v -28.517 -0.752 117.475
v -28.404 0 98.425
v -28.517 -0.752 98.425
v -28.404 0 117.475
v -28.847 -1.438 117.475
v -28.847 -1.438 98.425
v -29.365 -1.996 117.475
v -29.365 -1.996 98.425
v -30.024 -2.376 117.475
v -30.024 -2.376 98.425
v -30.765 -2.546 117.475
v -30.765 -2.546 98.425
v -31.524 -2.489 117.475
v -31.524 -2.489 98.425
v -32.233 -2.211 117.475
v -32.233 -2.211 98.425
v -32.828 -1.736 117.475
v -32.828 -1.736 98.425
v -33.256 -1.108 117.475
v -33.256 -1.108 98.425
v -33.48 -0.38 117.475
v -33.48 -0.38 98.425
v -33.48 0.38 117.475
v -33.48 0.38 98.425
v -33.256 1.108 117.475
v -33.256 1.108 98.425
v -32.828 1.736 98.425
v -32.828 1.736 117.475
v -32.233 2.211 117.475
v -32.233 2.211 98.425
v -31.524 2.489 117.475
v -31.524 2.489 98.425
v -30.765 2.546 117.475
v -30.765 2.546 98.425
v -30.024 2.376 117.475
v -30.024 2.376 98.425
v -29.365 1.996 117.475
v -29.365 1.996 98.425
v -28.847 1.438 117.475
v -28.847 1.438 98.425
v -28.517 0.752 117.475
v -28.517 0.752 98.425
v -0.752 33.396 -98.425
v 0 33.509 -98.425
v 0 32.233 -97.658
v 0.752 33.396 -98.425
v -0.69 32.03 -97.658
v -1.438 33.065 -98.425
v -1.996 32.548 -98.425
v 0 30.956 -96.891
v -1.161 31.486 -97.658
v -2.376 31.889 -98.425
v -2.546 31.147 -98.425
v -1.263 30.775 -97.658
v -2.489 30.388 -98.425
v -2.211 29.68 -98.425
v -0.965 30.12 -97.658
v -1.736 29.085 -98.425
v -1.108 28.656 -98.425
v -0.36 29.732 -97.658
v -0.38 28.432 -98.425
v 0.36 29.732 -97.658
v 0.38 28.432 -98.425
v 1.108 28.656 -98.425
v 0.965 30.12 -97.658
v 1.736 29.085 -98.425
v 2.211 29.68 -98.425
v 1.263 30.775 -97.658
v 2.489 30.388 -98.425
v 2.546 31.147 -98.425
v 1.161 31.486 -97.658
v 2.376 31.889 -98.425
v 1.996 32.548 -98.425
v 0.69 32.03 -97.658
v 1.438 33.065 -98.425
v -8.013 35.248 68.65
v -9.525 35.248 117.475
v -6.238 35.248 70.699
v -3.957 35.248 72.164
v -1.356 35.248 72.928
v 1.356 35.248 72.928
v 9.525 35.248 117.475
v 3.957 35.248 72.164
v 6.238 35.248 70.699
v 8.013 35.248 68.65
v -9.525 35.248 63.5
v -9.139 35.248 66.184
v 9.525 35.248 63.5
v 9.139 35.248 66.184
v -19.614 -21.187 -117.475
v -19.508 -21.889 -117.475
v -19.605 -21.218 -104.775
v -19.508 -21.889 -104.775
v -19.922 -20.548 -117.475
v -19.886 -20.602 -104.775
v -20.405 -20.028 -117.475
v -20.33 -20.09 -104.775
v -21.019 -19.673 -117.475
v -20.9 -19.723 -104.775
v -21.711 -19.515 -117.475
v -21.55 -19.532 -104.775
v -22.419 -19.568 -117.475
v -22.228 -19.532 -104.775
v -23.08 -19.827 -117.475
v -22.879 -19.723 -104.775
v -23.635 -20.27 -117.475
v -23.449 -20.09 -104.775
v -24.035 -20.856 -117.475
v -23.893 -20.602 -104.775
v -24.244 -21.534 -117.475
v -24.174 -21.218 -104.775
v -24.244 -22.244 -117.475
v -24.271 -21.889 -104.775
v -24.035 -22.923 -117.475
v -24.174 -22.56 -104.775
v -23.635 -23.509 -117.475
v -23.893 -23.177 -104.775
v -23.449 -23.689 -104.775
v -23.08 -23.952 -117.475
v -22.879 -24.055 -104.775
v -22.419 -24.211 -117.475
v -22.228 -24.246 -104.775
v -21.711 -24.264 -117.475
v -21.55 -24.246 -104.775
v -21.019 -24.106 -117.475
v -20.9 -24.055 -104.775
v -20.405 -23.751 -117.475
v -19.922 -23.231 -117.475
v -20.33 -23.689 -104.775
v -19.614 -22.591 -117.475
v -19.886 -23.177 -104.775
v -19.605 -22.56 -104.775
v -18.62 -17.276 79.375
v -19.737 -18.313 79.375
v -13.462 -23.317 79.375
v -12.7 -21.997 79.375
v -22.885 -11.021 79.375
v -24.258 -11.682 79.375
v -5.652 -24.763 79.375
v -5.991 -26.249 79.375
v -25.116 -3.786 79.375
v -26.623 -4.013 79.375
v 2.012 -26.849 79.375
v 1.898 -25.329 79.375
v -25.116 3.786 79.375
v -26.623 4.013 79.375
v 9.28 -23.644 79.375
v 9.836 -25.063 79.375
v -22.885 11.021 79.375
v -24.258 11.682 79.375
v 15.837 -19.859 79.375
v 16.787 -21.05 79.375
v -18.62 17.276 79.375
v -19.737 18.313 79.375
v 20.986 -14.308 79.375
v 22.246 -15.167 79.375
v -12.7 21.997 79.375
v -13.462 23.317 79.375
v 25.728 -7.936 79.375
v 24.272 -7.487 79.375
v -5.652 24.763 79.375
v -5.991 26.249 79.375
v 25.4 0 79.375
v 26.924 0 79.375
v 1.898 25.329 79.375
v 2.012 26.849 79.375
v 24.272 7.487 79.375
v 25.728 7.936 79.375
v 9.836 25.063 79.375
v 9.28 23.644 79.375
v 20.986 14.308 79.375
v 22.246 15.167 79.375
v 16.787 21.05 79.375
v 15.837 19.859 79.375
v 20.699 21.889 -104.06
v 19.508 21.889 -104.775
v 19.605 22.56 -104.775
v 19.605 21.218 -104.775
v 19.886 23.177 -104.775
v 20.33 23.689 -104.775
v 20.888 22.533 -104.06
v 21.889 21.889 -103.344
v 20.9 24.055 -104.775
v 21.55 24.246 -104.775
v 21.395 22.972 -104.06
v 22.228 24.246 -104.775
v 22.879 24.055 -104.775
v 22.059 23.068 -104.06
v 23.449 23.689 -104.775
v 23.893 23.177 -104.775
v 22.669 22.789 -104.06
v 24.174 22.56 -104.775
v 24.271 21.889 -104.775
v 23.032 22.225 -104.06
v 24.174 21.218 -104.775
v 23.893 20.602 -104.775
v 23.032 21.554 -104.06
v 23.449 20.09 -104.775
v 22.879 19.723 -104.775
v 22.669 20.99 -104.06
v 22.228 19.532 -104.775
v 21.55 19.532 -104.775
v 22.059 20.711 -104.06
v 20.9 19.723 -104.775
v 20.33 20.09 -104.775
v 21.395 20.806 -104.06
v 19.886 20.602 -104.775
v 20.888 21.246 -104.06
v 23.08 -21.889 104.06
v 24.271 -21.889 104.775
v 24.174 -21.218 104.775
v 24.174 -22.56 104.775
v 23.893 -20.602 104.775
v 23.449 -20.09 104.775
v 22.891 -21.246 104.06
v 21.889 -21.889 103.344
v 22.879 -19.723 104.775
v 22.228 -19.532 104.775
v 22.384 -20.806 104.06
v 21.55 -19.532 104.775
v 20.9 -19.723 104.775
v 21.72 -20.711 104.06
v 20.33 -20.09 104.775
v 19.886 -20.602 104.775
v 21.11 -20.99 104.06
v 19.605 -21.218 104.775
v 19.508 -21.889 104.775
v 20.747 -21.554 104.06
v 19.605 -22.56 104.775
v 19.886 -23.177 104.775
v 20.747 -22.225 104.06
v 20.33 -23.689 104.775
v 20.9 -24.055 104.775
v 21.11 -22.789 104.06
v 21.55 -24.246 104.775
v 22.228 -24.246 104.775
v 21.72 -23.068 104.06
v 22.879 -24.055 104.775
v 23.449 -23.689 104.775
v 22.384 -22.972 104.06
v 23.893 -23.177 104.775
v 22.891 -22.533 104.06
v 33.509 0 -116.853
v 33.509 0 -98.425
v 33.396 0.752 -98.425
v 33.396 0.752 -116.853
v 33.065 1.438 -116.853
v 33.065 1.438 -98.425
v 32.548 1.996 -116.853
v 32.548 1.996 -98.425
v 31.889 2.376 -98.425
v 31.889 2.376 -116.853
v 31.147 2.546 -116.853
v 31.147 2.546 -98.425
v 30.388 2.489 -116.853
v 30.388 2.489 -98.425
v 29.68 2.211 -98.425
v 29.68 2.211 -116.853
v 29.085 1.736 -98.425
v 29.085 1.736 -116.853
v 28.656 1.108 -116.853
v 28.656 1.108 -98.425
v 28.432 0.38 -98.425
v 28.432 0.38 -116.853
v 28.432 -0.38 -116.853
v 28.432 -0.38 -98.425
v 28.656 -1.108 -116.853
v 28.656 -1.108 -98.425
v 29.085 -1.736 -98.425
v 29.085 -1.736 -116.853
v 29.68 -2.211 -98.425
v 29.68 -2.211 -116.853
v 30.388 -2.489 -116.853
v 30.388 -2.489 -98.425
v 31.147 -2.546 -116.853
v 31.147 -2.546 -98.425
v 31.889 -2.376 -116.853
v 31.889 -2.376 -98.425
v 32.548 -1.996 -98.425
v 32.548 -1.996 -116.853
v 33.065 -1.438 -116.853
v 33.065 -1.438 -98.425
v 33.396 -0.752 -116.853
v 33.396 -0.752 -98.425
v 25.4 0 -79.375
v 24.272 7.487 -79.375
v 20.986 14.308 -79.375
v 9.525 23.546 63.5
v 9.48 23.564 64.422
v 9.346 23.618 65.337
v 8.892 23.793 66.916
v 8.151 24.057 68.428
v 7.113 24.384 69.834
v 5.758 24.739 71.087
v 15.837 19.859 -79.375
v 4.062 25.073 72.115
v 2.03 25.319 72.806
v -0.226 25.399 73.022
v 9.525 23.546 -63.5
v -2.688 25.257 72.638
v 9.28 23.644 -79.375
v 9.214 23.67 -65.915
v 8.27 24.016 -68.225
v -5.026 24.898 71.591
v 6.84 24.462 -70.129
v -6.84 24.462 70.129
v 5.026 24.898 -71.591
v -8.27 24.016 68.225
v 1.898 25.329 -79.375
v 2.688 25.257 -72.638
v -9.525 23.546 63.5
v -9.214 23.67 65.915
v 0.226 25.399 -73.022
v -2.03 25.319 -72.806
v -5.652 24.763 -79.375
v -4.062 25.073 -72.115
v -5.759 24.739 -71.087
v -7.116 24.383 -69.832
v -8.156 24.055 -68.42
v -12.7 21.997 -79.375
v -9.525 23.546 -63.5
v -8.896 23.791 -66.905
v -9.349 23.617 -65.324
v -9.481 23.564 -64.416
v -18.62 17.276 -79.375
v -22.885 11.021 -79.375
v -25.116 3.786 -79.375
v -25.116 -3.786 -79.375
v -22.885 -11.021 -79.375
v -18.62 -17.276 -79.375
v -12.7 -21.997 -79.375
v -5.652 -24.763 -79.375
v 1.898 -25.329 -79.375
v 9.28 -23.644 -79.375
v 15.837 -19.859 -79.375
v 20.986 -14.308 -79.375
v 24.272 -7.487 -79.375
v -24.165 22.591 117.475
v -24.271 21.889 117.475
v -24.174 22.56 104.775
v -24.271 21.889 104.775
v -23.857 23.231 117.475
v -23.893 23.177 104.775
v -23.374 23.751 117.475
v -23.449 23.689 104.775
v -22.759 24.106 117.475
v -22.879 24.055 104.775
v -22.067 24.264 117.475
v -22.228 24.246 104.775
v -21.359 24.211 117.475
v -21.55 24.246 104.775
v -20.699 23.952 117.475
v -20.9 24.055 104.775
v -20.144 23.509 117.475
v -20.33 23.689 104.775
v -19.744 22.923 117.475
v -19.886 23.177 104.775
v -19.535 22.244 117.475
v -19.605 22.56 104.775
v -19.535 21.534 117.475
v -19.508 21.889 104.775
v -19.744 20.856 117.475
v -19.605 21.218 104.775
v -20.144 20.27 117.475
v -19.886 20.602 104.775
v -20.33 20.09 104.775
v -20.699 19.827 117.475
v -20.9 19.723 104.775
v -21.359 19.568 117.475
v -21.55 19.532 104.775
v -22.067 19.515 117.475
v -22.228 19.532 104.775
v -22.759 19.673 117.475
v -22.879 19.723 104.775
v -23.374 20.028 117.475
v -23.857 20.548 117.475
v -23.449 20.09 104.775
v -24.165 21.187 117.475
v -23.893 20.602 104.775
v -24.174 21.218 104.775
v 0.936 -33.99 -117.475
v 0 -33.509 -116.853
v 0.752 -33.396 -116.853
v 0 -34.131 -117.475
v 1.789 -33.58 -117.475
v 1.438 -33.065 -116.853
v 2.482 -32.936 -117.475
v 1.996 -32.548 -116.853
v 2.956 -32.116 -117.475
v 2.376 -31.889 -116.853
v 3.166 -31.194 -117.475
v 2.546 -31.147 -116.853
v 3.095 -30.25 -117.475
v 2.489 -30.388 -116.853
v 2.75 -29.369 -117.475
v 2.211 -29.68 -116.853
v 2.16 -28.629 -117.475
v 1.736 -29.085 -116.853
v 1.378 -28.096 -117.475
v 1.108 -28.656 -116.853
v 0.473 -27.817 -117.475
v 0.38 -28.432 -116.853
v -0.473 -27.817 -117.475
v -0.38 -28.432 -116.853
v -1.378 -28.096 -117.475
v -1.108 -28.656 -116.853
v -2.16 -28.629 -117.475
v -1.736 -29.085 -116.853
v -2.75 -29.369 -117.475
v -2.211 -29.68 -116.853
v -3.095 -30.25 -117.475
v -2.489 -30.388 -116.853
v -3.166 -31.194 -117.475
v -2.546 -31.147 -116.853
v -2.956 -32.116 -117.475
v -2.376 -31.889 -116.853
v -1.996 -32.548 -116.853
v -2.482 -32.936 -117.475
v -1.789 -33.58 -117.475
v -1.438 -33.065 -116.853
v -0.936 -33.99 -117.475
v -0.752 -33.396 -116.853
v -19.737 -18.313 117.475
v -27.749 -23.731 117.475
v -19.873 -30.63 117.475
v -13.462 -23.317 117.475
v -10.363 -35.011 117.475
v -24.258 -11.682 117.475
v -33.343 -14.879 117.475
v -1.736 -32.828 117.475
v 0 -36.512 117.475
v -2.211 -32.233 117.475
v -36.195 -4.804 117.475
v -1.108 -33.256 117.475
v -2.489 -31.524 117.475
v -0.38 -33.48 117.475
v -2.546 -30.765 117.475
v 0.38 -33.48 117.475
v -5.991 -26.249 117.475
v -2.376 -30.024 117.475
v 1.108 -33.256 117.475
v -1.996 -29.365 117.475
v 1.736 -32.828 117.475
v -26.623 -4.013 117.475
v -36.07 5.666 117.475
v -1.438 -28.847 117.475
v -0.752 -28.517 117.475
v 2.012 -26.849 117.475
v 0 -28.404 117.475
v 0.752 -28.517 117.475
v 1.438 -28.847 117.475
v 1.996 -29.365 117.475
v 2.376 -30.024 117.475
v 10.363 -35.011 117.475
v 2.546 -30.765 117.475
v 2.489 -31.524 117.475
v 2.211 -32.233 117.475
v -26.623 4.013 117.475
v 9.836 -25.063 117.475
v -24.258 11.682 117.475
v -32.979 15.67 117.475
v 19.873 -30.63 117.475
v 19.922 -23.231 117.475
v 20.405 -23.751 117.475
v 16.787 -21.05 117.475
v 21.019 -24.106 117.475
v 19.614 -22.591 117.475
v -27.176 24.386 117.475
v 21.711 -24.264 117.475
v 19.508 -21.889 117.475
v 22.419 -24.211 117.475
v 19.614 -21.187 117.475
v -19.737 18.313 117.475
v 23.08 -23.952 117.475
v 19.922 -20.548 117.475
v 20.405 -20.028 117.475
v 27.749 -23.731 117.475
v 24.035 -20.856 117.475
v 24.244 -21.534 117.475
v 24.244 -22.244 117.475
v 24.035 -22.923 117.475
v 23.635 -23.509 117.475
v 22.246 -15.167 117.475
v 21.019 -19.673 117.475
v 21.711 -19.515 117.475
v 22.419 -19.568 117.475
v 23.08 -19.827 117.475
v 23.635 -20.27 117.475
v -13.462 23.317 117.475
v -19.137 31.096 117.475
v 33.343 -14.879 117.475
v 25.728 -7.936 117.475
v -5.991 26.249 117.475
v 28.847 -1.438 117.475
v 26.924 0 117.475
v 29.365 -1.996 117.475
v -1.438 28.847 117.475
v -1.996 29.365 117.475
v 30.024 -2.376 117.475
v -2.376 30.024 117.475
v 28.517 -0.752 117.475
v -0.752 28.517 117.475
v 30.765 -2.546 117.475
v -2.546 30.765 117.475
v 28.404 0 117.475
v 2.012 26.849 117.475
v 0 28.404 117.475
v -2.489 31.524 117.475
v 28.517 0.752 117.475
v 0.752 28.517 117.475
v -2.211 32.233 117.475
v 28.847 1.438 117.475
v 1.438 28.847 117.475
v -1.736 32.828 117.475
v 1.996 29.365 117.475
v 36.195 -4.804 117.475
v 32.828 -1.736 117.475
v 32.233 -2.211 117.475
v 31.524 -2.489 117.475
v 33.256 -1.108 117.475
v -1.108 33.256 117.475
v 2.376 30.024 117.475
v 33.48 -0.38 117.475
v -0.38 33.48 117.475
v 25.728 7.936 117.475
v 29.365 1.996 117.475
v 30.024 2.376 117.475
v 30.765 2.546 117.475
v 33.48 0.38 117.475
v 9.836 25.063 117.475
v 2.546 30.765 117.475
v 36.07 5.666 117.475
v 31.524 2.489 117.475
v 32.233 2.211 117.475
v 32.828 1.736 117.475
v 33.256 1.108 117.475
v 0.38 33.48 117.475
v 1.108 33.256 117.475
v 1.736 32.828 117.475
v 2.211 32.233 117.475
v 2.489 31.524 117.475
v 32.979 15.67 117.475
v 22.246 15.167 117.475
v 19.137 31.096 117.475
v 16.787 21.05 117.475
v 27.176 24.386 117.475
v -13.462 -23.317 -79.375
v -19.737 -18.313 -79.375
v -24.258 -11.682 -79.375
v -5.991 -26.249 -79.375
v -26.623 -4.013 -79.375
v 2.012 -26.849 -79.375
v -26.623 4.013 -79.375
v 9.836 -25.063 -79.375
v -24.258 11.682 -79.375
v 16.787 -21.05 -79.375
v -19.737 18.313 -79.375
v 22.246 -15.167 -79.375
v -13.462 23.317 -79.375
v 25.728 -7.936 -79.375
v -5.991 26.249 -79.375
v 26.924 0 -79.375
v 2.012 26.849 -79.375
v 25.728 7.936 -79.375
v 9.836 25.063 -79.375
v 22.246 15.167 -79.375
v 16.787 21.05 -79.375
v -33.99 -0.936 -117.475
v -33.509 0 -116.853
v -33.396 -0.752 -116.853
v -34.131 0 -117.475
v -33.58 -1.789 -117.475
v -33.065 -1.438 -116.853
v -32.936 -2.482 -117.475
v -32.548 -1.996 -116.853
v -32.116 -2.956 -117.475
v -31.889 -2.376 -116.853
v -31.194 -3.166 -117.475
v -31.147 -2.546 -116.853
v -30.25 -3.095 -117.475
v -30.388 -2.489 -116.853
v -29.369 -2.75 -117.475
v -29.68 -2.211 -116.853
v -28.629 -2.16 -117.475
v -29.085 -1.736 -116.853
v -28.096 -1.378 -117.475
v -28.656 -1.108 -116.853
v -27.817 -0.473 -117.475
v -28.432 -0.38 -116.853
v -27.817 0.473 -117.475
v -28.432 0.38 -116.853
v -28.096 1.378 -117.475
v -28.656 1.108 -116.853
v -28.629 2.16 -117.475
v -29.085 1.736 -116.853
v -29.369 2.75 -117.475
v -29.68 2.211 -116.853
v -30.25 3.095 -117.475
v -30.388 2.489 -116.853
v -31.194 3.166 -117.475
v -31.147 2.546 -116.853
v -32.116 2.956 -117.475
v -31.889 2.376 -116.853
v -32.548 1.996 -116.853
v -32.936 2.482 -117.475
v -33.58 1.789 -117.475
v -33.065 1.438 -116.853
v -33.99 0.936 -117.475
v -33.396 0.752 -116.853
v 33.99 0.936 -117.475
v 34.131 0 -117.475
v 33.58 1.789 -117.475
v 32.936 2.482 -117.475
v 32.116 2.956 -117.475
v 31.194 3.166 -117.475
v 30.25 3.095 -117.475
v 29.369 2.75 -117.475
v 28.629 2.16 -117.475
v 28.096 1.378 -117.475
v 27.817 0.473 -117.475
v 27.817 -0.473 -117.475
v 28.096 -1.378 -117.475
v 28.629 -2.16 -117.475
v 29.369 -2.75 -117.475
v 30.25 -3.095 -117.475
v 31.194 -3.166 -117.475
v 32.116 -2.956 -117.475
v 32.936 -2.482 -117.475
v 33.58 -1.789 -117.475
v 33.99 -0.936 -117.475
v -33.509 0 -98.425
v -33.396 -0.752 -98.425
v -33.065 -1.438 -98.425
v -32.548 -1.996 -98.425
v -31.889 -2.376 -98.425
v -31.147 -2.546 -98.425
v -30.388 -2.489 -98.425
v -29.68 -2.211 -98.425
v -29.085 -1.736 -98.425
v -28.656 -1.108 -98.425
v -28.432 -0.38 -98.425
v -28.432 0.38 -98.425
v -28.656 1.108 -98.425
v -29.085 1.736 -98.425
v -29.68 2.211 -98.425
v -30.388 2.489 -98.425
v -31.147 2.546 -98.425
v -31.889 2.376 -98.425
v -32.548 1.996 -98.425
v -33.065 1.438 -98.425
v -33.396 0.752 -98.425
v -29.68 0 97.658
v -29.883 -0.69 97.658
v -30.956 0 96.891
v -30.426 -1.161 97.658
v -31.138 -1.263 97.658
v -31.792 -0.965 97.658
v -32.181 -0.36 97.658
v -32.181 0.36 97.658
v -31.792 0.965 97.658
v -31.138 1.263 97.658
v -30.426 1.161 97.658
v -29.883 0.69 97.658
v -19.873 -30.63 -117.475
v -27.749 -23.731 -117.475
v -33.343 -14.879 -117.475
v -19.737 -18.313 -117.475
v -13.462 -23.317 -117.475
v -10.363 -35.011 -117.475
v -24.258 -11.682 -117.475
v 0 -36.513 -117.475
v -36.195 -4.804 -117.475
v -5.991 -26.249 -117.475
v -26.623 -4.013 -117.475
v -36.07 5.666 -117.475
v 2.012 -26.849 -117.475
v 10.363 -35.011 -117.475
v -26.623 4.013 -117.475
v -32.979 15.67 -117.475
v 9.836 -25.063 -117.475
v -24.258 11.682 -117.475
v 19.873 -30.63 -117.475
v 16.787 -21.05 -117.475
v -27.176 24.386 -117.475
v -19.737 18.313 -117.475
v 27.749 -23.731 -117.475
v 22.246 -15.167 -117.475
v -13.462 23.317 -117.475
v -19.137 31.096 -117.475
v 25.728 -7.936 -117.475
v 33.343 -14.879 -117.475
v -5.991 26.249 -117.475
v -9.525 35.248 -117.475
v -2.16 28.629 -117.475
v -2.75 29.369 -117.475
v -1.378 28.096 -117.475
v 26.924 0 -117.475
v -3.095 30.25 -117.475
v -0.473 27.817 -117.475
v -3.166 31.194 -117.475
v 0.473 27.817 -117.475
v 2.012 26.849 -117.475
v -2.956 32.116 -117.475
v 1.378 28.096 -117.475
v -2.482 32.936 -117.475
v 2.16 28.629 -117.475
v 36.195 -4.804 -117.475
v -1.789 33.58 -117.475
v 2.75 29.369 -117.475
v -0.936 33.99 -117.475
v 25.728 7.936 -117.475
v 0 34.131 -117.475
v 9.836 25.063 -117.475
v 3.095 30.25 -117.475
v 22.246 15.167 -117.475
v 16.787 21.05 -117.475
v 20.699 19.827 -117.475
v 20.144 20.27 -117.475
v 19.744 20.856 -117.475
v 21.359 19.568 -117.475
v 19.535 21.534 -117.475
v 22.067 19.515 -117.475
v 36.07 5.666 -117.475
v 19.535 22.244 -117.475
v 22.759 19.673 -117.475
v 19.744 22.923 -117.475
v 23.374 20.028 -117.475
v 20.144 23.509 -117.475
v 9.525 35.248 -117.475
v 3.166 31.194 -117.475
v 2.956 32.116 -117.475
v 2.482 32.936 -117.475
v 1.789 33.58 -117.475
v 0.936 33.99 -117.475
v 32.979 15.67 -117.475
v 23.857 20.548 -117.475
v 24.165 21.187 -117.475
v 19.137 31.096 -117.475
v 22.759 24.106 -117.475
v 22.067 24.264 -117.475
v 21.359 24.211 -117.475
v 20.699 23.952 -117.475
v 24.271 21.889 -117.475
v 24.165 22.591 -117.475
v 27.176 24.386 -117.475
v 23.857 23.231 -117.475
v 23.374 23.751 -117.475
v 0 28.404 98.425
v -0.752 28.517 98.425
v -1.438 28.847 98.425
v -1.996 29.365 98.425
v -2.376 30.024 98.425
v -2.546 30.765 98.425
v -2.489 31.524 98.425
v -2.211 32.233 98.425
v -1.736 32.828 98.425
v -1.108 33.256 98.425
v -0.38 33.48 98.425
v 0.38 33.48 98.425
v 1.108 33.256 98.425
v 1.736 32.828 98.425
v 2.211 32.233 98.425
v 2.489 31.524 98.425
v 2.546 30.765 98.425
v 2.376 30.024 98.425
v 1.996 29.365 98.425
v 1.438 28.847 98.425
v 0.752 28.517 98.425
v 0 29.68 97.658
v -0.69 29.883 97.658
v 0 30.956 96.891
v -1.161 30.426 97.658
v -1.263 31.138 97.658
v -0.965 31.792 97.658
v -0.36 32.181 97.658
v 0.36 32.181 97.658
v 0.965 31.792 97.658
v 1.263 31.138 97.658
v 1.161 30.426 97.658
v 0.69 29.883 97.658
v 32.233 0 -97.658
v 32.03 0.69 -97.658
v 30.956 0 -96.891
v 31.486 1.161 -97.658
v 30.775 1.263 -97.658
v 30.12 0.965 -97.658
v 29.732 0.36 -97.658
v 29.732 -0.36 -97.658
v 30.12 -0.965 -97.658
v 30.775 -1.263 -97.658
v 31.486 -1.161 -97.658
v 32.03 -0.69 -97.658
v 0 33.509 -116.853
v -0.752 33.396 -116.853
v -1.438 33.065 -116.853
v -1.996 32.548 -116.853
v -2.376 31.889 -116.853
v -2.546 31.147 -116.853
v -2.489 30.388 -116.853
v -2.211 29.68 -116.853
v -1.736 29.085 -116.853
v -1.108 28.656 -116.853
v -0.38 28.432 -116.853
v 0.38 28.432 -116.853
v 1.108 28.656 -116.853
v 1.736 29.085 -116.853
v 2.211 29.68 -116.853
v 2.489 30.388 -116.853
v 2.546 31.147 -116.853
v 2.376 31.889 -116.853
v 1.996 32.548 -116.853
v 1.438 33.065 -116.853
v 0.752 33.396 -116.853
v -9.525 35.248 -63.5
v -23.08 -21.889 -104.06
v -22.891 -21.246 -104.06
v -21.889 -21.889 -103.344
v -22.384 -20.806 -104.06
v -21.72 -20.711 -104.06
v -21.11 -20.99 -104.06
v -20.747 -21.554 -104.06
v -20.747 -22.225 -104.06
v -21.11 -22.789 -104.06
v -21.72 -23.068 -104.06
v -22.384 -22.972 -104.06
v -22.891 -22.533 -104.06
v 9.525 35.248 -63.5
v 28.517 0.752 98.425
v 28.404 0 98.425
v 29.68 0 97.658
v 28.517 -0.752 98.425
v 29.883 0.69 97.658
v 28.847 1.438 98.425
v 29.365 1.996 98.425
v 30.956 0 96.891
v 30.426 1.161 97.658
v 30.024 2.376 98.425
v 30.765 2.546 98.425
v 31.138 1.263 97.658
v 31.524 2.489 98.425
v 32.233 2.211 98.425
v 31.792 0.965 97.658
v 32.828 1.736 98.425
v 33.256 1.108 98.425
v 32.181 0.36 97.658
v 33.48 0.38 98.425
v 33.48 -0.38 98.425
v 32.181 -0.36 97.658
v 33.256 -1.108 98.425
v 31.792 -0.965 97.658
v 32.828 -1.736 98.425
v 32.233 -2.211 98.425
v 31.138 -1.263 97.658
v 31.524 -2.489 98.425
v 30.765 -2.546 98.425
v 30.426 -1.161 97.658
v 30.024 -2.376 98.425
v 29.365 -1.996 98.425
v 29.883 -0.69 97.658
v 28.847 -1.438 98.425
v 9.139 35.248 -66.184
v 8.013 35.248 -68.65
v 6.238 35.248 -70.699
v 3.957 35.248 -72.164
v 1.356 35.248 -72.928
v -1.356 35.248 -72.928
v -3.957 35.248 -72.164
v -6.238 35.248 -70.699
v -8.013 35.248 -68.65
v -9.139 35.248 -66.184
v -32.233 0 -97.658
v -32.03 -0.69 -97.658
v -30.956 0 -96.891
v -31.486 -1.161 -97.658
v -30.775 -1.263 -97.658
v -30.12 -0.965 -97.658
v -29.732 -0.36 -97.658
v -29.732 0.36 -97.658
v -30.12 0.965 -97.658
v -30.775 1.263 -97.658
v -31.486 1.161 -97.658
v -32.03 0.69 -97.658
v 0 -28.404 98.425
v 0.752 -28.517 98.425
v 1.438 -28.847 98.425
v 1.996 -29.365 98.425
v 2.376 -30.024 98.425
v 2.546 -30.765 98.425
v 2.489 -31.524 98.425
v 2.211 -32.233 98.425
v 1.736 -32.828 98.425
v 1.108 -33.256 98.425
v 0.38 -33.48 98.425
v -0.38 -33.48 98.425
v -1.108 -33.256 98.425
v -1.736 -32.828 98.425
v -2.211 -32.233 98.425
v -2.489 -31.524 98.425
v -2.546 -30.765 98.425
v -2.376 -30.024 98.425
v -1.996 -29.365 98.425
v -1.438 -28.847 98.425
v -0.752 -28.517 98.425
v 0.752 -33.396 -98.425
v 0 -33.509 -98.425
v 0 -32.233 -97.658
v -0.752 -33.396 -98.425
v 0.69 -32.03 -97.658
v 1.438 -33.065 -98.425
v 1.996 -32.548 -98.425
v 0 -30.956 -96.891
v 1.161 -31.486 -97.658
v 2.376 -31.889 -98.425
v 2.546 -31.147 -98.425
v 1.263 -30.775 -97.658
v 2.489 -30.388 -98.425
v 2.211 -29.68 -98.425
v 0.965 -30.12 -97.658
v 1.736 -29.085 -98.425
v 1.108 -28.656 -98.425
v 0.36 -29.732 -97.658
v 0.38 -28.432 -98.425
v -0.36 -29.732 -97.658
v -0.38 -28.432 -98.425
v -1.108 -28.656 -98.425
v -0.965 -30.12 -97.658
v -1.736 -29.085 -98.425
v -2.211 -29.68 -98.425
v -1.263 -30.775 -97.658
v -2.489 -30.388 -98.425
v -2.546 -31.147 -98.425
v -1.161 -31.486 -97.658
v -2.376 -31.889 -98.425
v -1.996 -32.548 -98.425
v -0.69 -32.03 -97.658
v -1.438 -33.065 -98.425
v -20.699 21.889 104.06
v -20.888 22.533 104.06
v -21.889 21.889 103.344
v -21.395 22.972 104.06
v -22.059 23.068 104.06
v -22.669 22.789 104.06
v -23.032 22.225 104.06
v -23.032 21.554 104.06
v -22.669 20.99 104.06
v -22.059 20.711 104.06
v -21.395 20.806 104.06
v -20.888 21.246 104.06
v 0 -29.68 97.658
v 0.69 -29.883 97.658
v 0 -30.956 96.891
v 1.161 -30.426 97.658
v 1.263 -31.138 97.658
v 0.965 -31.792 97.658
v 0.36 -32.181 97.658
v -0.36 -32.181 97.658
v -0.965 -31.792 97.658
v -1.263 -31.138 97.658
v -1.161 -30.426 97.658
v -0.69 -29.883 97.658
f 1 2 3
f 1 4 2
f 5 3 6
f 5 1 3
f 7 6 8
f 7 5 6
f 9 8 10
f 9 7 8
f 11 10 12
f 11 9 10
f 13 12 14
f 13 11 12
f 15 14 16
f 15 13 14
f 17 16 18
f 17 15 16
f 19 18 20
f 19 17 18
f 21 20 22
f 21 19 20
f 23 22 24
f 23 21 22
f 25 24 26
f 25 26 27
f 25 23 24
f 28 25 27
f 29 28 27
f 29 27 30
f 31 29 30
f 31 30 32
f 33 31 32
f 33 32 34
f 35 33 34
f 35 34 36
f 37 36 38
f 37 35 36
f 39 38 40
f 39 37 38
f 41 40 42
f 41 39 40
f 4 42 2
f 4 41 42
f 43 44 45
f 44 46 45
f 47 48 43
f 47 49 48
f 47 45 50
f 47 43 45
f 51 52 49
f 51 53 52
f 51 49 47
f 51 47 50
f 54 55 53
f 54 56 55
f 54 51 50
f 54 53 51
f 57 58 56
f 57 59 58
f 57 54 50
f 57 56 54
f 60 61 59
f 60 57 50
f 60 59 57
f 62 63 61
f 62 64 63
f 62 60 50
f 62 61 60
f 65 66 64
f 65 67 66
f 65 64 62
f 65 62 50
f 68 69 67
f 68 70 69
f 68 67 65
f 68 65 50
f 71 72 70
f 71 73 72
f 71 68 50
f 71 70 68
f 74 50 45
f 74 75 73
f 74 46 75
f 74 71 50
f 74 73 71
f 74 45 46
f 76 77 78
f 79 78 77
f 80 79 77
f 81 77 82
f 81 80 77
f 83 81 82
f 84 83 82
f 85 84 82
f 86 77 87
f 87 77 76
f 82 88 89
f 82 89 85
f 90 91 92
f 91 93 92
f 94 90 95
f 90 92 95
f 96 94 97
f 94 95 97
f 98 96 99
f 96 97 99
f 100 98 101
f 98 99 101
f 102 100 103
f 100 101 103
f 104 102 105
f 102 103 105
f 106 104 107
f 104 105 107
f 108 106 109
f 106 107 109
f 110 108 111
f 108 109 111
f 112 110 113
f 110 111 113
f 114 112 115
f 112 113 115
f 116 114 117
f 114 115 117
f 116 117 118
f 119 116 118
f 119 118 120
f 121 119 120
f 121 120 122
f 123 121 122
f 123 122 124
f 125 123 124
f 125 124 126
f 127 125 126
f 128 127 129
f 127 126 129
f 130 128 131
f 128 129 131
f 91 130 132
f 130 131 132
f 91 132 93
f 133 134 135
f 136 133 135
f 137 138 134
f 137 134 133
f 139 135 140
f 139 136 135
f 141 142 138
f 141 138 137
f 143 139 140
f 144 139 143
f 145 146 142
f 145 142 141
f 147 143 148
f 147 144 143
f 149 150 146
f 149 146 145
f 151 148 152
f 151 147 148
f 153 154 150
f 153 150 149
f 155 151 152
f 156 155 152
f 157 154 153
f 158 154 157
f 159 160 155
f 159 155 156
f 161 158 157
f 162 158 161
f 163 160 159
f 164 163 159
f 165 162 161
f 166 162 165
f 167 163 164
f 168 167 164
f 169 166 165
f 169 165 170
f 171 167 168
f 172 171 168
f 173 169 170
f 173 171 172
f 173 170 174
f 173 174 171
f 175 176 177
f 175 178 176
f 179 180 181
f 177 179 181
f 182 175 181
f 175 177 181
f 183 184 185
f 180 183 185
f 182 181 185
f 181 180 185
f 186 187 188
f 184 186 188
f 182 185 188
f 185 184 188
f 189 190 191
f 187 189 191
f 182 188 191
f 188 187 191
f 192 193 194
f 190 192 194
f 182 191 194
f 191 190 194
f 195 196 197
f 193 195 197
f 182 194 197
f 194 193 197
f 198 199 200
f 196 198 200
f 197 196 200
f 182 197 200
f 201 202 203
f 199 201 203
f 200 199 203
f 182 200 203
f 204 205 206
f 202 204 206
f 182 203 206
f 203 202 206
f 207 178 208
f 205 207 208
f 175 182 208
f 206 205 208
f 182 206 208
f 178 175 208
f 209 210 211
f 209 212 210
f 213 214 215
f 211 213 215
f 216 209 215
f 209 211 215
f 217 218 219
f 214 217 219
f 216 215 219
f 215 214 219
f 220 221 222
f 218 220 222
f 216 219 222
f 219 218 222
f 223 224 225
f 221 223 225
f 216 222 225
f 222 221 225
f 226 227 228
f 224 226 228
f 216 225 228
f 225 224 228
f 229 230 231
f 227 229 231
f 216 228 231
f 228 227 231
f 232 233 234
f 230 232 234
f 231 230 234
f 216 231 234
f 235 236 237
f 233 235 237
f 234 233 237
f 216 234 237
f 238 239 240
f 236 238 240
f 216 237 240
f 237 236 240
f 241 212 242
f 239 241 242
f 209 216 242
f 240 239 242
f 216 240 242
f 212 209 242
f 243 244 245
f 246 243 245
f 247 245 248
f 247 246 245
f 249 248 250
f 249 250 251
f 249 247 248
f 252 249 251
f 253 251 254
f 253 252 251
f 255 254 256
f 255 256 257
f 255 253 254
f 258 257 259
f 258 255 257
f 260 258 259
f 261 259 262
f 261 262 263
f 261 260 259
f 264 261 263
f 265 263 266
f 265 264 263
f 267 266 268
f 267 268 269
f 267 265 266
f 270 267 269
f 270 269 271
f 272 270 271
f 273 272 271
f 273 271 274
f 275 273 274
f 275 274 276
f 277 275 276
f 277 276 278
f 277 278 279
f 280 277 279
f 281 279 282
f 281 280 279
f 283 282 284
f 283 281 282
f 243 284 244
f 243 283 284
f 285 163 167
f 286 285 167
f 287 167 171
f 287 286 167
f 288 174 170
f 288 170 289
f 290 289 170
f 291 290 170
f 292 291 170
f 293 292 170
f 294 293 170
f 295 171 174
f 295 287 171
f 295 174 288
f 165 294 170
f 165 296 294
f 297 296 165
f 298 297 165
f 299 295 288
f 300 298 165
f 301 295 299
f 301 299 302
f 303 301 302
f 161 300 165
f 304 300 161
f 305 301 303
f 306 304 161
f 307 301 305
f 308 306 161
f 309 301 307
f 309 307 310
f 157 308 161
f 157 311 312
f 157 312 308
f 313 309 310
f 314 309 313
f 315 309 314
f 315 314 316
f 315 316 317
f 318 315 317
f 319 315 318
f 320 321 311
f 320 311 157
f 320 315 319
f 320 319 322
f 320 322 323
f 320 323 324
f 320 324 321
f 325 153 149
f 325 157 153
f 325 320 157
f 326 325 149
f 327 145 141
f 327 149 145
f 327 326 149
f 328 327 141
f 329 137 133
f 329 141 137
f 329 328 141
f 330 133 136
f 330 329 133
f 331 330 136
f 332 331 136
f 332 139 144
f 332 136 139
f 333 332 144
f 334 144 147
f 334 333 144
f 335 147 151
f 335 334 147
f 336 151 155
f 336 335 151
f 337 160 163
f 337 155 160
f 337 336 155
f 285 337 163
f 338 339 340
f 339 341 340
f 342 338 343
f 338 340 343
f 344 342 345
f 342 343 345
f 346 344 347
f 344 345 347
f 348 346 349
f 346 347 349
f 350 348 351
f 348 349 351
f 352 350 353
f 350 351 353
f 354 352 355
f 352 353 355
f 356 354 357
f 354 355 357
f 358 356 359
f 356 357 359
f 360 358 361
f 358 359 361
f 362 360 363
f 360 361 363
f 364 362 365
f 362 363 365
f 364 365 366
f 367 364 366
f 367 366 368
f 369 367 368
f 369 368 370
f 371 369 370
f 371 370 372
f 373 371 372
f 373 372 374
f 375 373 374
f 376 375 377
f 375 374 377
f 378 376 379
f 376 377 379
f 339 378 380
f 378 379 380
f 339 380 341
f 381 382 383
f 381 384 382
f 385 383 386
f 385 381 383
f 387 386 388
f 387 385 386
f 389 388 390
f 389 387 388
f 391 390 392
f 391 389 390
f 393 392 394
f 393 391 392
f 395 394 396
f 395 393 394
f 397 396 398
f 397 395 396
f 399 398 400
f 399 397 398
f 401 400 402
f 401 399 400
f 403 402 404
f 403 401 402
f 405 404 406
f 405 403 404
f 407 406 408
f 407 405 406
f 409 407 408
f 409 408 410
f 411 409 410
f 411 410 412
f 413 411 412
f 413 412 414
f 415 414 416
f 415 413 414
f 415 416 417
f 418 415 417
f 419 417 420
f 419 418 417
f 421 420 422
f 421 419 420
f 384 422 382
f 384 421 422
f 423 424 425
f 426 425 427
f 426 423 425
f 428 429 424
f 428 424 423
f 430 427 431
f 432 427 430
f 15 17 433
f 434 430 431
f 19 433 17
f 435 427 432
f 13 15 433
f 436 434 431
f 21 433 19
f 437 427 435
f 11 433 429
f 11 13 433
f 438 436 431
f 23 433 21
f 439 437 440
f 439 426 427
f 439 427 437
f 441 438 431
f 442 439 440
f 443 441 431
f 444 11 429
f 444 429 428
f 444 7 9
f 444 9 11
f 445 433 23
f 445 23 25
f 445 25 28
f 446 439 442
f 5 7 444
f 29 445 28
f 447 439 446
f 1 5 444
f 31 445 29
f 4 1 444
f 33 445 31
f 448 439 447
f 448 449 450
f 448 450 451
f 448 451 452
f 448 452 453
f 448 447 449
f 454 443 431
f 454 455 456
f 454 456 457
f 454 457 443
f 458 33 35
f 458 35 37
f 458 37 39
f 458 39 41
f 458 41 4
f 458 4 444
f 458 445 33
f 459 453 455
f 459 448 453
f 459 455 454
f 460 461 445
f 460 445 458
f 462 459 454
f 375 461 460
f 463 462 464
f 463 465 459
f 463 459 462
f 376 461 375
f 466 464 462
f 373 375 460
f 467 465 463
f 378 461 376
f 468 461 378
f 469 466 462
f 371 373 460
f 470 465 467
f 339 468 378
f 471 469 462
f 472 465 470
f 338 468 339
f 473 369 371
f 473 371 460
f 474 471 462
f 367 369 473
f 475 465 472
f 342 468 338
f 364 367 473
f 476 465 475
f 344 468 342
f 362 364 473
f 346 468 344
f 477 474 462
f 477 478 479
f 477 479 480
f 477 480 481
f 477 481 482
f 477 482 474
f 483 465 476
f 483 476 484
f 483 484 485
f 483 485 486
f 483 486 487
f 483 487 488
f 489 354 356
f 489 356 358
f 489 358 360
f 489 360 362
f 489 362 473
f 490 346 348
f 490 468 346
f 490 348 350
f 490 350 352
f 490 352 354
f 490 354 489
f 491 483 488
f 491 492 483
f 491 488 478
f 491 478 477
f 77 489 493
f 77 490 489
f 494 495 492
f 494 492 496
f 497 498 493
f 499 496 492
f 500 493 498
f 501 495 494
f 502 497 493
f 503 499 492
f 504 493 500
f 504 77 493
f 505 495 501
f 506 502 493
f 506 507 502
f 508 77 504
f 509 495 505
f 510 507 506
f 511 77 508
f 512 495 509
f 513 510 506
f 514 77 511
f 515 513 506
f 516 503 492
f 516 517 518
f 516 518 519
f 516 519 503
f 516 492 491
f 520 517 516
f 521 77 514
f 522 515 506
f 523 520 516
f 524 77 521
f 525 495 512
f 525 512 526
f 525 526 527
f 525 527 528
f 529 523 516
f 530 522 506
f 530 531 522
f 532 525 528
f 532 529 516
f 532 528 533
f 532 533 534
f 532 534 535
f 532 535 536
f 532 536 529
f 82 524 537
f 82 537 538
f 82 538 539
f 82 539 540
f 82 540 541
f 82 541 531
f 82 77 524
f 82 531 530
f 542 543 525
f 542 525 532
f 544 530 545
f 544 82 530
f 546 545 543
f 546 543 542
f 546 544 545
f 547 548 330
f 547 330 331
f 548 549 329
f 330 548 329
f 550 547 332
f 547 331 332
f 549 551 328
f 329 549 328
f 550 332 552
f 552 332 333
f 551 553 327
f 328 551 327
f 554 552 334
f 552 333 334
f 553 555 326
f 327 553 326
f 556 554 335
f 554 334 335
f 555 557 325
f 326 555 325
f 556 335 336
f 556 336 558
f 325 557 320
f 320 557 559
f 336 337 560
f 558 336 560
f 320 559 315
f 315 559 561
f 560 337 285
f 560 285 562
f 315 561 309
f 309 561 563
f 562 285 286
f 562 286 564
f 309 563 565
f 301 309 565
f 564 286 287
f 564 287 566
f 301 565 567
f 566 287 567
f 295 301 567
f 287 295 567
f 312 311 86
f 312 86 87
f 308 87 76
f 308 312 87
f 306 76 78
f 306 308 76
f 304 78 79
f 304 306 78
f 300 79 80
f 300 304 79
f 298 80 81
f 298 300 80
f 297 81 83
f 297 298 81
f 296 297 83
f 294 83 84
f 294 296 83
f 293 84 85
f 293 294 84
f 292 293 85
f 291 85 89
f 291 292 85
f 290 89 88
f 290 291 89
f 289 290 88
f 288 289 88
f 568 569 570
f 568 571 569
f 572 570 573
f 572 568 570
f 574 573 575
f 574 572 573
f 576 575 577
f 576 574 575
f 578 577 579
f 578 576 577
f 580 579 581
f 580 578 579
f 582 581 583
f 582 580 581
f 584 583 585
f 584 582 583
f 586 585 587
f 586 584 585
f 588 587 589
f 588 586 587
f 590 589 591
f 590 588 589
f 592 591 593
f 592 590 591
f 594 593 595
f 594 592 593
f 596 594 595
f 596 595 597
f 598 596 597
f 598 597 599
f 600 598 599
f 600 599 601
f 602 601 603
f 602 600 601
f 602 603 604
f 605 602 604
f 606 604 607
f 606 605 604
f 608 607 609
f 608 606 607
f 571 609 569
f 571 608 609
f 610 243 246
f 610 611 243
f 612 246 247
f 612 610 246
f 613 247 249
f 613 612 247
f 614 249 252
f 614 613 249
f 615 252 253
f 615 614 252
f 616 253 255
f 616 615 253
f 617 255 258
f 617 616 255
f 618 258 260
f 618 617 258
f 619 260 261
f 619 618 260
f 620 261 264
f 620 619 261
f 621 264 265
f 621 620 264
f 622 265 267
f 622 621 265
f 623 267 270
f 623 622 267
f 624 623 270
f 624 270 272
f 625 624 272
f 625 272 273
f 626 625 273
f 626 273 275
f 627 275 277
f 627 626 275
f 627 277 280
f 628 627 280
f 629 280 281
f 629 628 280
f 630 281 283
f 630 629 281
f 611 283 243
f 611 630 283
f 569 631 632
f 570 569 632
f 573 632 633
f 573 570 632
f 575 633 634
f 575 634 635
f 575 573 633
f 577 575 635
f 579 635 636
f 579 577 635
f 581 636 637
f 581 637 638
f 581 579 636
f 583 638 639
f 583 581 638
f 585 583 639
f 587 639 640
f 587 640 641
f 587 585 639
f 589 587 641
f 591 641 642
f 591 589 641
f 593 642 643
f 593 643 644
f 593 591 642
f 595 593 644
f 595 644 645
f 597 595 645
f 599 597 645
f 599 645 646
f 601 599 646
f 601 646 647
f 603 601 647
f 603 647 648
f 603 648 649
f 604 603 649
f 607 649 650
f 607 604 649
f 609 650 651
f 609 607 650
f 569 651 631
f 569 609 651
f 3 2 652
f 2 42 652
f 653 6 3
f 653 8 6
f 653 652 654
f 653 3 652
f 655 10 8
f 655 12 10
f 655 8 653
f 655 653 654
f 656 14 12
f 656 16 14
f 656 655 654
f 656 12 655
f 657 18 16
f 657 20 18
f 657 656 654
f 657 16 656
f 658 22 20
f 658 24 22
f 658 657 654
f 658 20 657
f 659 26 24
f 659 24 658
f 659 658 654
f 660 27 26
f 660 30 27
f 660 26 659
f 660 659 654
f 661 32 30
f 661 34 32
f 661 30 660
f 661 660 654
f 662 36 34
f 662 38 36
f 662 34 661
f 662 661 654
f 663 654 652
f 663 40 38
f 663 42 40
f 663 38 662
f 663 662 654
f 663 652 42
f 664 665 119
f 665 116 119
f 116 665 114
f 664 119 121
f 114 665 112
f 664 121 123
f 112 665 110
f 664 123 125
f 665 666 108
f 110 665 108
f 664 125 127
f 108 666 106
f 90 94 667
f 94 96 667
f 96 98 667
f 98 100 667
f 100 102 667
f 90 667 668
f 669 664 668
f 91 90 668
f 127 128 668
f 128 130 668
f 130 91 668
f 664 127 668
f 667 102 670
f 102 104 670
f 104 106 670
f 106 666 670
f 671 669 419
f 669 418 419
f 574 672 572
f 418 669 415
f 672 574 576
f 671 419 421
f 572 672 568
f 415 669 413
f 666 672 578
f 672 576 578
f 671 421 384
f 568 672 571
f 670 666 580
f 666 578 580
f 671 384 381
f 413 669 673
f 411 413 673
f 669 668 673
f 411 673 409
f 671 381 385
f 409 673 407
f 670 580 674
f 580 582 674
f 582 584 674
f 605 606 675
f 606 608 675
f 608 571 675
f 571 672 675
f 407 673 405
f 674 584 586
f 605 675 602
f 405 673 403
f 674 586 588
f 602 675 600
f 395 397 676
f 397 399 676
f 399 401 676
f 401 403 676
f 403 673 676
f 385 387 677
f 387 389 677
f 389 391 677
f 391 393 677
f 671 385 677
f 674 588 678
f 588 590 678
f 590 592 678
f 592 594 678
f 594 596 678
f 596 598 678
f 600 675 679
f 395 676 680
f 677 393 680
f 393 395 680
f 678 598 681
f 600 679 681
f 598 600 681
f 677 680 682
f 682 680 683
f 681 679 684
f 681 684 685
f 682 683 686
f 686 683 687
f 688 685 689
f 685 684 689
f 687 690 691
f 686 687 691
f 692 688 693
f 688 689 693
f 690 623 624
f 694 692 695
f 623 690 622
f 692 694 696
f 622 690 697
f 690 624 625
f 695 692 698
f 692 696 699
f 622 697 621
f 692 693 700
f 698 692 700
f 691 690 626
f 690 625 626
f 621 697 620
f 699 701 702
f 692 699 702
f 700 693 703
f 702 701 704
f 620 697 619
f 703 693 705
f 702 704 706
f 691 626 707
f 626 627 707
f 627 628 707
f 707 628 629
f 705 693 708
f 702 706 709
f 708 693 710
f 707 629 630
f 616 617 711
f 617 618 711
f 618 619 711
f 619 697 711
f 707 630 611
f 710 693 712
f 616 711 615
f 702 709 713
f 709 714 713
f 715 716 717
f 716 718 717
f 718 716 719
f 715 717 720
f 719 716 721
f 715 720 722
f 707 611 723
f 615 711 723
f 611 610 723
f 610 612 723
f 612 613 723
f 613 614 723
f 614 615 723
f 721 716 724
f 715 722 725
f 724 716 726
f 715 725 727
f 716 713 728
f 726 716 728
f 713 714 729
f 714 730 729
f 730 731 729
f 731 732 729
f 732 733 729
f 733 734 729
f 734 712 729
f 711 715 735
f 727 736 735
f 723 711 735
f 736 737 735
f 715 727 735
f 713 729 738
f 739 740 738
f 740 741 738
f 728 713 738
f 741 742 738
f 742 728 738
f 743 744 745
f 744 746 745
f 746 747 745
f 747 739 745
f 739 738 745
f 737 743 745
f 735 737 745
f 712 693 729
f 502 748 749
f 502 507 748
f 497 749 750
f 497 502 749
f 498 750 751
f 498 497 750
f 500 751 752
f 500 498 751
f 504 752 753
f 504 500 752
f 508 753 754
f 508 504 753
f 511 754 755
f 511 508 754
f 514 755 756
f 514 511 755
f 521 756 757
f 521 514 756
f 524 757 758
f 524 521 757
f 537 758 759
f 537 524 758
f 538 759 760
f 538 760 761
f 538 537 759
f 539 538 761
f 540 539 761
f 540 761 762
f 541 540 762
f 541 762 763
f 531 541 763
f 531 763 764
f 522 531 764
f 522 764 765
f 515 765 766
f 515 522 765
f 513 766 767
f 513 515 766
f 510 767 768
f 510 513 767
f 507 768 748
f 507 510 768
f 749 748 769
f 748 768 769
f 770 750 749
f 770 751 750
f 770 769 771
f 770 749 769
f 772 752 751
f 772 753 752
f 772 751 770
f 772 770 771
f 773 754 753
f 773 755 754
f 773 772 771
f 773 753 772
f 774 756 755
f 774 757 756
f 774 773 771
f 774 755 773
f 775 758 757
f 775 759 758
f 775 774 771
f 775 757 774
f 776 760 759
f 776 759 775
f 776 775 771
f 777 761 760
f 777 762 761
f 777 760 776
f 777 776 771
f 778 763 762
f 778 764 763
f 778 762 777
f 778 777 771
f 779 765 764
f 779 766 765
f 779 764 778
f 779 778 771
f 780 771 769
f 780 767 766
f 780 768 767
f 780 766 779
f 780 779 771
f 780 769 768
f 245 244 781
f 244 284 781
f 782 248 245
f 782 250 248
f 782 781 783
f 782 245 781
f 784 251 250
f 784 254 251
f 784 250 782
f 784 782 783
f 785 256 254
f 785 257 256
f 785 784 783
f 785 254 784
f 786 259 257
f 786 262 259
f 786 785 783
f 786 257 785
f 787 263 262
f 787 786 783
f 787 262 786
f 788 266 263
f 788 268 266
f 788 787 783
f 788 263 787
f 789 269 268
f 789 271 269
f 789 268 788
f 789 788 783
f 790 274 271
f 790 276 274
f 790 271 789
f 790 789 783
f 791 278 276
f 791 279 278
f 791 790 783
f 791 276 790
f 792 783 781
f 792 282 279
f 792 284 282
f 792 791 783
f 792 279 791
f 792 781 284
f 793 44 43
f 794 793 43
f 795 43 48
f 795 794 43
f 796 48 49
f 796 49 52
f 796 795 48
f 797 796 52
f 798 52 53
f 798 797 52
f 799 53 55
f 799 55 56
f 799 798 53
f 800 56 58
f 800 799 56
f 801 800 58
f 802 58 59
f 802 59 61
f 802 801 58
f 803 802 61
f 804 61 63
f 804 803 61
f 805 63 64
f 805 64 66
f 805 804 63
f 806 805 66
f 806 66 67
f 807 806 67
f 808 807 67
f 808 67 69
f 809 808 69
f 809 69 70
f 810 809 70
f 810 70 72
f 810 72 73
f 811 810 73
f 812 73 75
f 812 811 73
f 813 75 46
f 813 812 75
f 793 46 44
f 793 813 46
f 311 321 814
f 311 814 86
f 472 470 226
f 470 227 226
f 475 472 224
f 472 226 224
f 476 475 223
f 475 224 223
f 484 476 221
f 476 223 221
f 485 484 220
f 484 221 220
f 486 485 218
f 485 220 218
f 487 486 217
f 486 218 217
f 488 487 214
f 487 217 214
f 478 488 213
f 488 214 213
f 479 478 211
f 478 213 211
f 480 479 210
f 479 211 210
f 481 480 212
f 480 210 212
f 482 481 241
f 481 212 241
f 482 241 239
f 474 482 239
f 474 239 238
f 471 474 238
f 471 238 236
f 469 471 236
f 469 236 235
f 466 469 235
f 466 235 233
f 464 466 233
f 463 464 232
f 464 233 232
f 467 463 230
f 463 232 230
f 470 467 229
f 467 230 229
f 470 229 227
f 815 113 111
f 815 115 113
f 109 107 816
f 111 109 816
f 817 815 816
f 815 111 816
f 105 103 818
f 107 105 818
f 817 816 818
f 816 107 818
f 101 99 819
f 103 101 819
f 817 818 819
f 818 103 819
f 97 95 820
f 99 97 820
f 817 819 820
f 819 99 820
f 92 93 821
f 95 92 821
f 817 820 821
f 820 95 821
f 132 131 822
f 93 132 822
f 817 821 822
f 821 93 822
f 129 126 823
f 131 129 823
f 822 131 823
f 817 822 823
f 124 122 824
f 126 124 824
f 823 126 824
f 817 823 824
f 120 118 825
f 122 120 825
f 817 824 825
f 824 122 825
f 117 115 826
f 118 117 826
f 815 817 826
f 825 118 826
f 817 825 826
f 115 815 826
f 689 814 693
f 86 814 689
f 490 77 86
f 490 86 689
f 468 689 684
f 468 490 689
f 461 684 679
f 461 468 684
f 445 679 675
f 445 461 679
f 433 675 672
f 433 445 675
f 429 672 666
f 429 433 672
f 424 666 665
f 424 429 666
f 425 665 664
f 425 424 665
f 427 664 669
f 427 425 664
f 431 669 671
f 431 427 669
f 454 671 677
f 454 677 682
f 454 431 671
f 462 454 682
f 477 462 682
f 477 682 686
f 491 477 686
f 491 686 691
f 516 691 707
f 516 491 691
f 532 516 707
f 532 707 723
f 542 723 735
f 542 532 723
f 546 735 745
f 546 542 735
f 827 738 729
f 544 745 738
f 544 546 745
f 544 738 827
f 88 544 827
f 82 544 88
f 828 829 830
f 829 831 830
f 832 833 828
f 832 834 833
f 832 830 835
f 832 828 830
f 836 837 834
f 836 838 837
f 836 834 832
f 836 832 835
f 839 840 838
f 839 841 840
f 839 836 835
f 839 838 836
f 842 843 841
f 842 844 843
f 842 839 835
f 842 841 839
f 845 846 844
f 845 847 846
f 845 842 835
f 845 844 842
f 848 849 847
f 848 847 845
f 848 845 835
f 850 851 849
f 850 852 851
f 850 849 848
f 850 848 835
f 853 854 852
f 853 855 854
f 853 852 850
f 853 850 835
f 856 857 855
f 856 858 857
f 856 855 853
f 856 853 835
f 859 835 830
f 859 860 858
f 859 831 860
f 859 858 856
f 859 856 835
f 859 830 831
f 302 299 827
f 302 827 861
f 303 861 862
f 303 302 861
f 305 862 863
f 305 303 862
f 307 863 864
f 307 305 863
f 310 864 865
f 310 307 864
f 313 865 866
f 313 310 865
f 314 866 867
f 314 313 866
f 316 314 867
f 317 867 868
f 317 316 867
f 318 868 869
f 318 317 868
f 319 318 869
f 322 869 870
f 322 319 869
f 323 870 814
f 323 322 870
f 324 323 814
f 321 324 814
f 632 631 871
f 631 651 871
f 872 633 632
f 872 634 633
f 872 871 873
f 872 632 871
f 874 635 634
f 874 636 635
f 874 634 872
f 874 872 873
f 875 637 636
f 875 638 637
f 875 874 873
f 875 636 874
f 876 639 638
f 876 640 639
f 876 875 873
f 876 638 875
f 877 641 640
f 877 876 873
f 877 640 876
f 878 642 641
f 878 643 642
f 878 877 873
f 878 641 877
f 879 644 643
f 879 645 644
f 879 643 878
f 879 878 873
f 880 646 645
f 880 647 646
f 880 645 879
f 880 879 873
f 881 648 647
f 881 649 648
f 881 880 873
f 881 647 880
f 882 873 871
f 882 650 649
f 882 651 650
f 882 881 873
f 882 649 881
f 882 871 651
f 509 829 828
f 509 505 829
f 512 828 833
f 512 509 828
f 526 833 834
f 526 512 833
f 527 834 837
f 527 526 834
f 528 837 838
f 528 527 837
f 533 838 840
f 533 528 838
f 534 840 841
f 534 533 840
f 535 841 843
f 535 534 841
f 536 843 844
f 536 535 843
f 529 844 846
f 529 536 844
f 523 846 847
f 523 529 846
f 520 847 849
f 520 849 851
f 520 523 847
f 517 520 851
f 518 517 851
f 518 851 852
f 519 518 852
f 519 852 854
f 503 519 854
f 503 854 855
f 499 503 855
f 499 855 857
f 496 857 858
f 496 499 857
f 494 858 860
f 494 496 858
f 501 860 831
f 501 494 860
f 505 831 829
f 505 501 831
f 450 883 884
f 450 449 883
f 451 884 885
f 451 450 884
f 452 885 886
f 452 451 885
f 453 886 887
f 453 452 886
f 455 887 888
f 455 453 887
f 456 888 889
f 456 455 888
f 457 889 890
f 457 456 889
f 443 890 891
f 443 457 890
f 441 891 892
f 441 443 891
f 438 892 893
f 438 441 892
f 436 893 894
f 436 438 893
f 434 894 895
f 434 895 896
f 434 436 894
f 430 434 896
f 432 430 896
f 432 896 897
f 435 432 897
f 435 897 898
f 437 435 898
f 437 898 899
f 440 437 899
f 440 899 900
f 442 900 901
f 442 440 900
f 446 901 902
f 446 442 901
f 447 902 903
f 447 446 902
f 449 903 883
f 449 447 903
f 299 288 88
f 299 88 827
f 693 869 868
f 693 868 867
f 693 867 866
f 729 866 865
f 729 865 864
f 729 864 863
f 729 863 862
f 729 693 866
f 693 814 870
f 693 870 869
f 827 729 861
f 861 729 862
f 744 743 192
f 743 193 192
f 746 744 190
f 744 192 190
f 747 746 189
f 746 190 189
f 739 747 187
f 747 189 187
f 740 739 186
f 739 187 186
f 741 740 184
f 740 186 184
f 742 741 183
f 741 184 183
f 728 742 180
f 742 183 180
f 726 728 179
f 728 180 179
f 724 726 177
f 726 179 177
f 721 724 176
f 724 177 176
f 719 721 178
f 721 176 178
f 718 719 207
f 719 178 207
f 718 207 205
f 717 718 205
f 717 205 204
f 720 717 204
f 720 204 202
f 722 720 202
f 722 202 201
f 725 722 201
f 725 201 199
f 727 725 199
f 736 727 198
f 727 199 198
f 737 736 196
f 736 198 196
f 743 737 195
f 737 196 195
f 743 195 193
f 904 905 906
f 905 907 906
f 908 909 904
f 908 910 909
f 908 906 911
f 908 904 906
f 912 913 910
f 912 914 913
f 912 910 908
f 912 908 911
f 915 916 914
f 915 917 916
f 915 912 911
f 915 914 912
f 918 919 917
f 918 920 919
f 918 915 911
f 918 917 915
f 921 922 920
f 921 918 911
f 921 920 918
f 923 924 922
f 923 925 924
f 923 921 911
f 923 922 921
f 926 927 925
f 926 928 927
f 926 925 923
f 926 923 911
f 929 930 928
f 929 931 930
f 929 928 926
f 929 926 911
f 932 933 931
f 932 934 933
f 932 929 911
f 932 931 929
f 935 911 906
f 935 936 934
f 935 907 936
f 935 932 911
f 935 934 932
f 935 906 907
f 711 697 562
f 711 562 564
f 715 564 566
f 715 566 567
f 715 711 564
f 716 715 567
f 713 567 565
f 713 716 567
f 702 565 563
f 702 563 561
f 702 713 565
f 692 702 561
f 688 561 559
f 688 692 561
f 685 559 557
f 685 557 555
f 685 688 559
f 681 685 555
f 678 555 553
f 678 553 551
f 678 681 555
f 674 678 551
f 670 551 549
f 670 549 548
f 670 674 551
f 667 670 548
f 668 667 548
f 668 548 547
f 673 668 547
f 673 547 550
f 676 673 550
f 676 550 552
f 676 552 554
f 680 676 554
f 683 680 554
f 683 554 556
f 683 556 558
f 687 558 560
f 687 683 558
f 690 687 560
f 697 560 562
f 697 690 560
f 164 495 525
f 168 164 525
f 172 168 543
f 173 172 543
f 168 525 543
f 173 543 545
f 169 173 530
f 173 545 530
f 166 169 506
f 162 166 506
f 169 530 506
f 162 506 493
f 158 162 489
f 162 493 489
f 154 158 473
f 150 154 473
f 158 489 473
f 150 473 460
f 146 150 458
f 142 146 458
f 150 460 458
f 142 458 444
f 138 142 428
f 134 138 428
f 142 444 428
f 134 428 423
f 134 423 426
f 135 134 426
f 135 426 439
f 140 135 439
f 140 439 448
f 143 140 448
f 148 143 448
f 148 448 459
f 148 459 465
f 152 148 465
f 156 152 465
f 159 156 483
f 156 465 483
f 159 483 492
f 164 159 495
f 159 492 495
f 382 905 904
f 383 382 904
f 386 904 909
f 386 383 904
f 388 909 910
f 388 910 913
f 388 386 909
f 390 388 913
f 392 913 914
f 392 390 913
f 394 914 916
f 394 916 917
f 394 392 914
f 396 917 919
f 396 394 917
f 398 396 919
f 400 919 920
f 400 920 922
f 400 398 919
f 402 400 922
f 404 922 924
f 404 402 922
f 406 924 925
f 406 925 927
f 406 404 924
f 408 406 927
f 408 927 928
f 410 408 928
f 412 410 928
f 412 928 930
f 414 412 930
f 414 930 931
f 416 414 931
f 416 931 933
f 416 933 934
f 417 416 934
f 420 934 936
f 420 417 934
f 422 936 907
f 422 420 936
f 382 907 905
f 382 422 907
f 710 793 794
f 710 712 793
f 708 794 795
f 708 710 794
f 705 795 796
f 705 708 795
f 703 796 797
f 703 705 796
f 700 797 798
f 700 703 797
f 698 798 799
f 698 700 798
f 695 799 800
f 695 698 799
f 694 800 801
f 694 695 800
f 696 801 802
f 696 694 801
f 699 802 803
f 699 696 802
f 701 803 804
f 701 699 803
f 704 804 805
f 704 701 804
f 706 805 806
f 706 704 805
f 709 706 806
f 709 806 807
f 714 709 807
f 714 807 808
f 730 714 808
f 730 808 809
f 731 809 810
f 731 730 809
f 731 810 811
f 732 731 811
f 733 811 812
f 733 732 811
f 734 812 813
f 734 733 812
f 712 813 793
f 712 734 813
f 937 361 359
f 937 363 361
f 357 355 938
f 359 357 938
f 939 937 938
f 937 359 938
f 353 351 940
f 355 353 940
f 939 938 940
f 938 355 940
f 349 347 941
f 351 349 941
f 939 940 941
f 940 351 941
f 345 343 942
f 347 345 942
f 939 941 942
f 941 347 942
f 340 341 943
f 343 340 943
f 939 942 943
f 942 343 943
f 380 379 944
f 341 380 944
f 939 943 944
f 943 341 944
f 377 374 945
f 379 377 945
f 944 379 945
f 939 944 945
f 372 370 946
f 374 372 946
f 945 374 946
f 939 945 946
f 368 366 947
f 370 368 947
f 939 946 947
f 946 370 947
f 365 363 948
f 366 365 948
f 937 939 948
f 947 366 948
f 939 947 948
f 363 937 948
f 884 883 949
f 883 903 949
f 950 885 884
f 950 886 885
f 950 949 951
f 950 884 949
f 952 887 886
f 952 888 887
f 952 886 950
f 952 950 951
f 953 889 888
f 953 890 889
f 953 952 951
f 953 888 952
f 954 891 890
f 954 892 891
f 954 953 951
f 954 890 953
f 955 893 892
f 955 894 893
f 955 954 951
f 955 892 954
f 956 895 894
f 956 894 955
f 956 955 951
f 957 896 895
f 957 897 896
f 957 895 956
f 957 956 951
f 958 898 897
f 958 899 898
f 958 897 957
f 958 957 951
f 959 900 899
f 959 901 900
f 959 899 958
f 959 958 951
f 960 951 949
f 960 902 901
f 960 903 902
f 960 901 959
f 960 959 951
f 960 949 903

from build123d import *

# Parameters (mm, degrees)
BOLT_CIRCLE_R                      = 36.5125
BOLT_CIRCLE_R_2                    = 25.4
BASE_SHAPE_DEPTH                   = 117.475
BOLT_PATTERN_COUNT                 = 4
SLOT_DEPTH                         = 129.3226439
SKETCH17_R                         = 26.924
INNER_STEP_DEPTH                   = 38.1
EXTRUDE1_DEPTH                     = 129.322644049
EXTRUDE1_DEPTH_BACK                = 129.322644049
SKETCH20_W                         = 37.44274537
SKETCH20_H                         = 1.704436823
ALIGNMENT_PIN_HOLES_D              = 4.7625
ALIGNMENT_PIN_HOLES_DEPTH          = 12.7
ALIGNMENT_PIN_HOLES_TIP            = 1.430799349
F_3_16_0_1875_DIAMETER_HOLE1_D     = 4.7625
F_3_16_0_1875_DIAMETER_HOLE1_DEPTH = 12.7
F_3_16_0_1875_DIAMETER_HOLE1_TIP   = 1.430799349


with BuildPart() as part:
    # Bolt circle → Base shape (new, symmetric)
    with BuildSketch(Plane.XY):
        Circle(BOLT_CIRCLE_R)
        Circle(BOLT_CIRCLE_R_2, mode=Mode.SUBTRACT)
    extrude(amount=BASE_SHAPE_DEPTH, both=True)

    # Sketch10 → 1/4-20 #1 (revolve, cut)
    with BuildSketch(Plane(origin=(0, 30.95625, -117.475), x_dir=(0, 1, 0), z_dir=(1, 0, 0))):
        Polygon((0, 0), (0, 20.583816902), (2.5527, 19.05), (2.5527, 0.6223), (3.175, 0), align=None)
    hole_wizard_1_4_20_1 = revolve(axis=Axis((0, 30.95625, -123.825), (0, 0, 1)), mode=Mode.SUBTRACT)

    # Sketch11 → 1/4-20 #2 (revolve, cut)
    with BuildSketch(Plane(origin=(0, 30.95625, 117.475), x_dir=(0, -1, 0), z_dir=(1, 0, 0))):
        Polygon((0, 0), (0, 20.583816902), (2.5527, 19.05), (2.5527, 0), align=None)
    hole_wizard_1_4_20_2 = revolve(axis=Axis((0, 30.95625, 123.825), (0, 0, -1)), mode=Mode.SUBTRACT)

    # Bolt pattern: 1/4-20 #1, 1/4-20 #2 ×4 about axis
    bolt_pattern_axis = Axis((0, 0, -80.9), (0, 0, 1))
    add([hole_wizard_1_4_20_1.rotate(bolt_pattern_axis, i * 360 / BOLT_PATTERN_COUNT) for i in range(1, BOLT_PATTERN_COUNT)], mode=Mode.SUBTRACT)
    add([hole_wizard_1_4_20_2.rotate(bolt_pattern_axis, i * 360 / BOLT_PATTERN_COUNT) for i in range(1, BOLT_PATTERN_COUNT)], mode=Mode.SUBTRACT)

    # Sketch14 → Slot (cut, through all)
    with BuildSketch(Plane(origin=(0, 0, 0), x_dir=(1, 0, 0), z_dir=(0, 1, 0))):
        with BuildLine():
            Line((-9.525, 63.5), (-9.525, -63.5))
            ThreePointArc((-9.525, -63.5), (0, -73.025), (9.525, -63.5))
            Line((9.525, -63.5), (9.525, 63.5))
            ThreePointArc((9.525, 63.5), (0, 73.025), (-9.525, 63.5))
        make_face()
    extrude(amount=SLOT_DEPTH, mode=Mode.SUBTRACT)

    # Sketch17 → Inner Step (cut)
    with BuildSketch(Plane.XY.offset(117.475)):
        Circle(SKETCH17_R)
    inner_step = extrude(amount=-INNER_STEP_DEPTH, mode=Mode.SUBTRACT)

    # Step Mirror: Inner Step across plane
    add(inner_step.mirror(Plane.XY), mode=Mode.SUBTRACT)

    # Sketch20 → Extrude1 (cut, two sides: drawn at the far end of the back side and taken through both)
    with BuildSketch(Plane.XY.offset(-EXTRUDE1_DEPTH_BACK)):
        with Locations((-0.049008829, 36.100438668)):
            Rectangle(SKETCH20_W, SKETCH20_H)
    extrude(amount=EXTRUDE1_DEPTH + EXTRUDE1_DEPTH_BACK, mode=Mode.SUBTRACT)

    # Alignment_pin_holes
    with Locations(Plane.XY.offset(117.475)):
        with Locations((-21.889374295, 21.889374295), (21.889374295, -21.889374295)):
            Hole(ALIGNMENT_PIN_HOLES_D / 2, depth=ALIGNMENT_PIN_HOLES_DEPTH)
            with Locations((0, 0, -(ALIGNMENT_PIN_HOLES_DEPTH + ALIGNMENT_PIN_HOLES_TIP / 2))):  # 118° drill point
                Cone(0, ALIGNMENT_PIN_HOLES_D / 2, ALIGNMENT_PIN_HOLES_TIP, mode=Mode.SUBTRACT)

    # 3/16 (0.1875) Diameter Hole1
    with Locations(Plane(origin=(0, 0, -117.475), x_dir=(-1, 0, 0), z_dir=(0, 0, -1))):
        with Locations((-21.889374295, 21.889374295), (21.889374295, -21.889374295)):
            Hole(F_3_16_0_1875_DIAMETER_HOLE1_D / 2, depth=F_3_16_0_1875_DIAMETER_HOLE1_DEPTH)
            with Locations((0, 0, -(F_3_16_0_1875_DIAMETER_HOLE1_DEPTH + F_3_16_0_1875_DIAMETER_HOLE1_TIP / 2))):  # 118° drill point
                Cone(0, F_3_16_0_1875_DIAMETER_HOLE1_D / 2, F_3_16_0_1875_DIAMETER_HOLE1_TIP, mode=Mode.SUBTRACT)


solid = part.part
